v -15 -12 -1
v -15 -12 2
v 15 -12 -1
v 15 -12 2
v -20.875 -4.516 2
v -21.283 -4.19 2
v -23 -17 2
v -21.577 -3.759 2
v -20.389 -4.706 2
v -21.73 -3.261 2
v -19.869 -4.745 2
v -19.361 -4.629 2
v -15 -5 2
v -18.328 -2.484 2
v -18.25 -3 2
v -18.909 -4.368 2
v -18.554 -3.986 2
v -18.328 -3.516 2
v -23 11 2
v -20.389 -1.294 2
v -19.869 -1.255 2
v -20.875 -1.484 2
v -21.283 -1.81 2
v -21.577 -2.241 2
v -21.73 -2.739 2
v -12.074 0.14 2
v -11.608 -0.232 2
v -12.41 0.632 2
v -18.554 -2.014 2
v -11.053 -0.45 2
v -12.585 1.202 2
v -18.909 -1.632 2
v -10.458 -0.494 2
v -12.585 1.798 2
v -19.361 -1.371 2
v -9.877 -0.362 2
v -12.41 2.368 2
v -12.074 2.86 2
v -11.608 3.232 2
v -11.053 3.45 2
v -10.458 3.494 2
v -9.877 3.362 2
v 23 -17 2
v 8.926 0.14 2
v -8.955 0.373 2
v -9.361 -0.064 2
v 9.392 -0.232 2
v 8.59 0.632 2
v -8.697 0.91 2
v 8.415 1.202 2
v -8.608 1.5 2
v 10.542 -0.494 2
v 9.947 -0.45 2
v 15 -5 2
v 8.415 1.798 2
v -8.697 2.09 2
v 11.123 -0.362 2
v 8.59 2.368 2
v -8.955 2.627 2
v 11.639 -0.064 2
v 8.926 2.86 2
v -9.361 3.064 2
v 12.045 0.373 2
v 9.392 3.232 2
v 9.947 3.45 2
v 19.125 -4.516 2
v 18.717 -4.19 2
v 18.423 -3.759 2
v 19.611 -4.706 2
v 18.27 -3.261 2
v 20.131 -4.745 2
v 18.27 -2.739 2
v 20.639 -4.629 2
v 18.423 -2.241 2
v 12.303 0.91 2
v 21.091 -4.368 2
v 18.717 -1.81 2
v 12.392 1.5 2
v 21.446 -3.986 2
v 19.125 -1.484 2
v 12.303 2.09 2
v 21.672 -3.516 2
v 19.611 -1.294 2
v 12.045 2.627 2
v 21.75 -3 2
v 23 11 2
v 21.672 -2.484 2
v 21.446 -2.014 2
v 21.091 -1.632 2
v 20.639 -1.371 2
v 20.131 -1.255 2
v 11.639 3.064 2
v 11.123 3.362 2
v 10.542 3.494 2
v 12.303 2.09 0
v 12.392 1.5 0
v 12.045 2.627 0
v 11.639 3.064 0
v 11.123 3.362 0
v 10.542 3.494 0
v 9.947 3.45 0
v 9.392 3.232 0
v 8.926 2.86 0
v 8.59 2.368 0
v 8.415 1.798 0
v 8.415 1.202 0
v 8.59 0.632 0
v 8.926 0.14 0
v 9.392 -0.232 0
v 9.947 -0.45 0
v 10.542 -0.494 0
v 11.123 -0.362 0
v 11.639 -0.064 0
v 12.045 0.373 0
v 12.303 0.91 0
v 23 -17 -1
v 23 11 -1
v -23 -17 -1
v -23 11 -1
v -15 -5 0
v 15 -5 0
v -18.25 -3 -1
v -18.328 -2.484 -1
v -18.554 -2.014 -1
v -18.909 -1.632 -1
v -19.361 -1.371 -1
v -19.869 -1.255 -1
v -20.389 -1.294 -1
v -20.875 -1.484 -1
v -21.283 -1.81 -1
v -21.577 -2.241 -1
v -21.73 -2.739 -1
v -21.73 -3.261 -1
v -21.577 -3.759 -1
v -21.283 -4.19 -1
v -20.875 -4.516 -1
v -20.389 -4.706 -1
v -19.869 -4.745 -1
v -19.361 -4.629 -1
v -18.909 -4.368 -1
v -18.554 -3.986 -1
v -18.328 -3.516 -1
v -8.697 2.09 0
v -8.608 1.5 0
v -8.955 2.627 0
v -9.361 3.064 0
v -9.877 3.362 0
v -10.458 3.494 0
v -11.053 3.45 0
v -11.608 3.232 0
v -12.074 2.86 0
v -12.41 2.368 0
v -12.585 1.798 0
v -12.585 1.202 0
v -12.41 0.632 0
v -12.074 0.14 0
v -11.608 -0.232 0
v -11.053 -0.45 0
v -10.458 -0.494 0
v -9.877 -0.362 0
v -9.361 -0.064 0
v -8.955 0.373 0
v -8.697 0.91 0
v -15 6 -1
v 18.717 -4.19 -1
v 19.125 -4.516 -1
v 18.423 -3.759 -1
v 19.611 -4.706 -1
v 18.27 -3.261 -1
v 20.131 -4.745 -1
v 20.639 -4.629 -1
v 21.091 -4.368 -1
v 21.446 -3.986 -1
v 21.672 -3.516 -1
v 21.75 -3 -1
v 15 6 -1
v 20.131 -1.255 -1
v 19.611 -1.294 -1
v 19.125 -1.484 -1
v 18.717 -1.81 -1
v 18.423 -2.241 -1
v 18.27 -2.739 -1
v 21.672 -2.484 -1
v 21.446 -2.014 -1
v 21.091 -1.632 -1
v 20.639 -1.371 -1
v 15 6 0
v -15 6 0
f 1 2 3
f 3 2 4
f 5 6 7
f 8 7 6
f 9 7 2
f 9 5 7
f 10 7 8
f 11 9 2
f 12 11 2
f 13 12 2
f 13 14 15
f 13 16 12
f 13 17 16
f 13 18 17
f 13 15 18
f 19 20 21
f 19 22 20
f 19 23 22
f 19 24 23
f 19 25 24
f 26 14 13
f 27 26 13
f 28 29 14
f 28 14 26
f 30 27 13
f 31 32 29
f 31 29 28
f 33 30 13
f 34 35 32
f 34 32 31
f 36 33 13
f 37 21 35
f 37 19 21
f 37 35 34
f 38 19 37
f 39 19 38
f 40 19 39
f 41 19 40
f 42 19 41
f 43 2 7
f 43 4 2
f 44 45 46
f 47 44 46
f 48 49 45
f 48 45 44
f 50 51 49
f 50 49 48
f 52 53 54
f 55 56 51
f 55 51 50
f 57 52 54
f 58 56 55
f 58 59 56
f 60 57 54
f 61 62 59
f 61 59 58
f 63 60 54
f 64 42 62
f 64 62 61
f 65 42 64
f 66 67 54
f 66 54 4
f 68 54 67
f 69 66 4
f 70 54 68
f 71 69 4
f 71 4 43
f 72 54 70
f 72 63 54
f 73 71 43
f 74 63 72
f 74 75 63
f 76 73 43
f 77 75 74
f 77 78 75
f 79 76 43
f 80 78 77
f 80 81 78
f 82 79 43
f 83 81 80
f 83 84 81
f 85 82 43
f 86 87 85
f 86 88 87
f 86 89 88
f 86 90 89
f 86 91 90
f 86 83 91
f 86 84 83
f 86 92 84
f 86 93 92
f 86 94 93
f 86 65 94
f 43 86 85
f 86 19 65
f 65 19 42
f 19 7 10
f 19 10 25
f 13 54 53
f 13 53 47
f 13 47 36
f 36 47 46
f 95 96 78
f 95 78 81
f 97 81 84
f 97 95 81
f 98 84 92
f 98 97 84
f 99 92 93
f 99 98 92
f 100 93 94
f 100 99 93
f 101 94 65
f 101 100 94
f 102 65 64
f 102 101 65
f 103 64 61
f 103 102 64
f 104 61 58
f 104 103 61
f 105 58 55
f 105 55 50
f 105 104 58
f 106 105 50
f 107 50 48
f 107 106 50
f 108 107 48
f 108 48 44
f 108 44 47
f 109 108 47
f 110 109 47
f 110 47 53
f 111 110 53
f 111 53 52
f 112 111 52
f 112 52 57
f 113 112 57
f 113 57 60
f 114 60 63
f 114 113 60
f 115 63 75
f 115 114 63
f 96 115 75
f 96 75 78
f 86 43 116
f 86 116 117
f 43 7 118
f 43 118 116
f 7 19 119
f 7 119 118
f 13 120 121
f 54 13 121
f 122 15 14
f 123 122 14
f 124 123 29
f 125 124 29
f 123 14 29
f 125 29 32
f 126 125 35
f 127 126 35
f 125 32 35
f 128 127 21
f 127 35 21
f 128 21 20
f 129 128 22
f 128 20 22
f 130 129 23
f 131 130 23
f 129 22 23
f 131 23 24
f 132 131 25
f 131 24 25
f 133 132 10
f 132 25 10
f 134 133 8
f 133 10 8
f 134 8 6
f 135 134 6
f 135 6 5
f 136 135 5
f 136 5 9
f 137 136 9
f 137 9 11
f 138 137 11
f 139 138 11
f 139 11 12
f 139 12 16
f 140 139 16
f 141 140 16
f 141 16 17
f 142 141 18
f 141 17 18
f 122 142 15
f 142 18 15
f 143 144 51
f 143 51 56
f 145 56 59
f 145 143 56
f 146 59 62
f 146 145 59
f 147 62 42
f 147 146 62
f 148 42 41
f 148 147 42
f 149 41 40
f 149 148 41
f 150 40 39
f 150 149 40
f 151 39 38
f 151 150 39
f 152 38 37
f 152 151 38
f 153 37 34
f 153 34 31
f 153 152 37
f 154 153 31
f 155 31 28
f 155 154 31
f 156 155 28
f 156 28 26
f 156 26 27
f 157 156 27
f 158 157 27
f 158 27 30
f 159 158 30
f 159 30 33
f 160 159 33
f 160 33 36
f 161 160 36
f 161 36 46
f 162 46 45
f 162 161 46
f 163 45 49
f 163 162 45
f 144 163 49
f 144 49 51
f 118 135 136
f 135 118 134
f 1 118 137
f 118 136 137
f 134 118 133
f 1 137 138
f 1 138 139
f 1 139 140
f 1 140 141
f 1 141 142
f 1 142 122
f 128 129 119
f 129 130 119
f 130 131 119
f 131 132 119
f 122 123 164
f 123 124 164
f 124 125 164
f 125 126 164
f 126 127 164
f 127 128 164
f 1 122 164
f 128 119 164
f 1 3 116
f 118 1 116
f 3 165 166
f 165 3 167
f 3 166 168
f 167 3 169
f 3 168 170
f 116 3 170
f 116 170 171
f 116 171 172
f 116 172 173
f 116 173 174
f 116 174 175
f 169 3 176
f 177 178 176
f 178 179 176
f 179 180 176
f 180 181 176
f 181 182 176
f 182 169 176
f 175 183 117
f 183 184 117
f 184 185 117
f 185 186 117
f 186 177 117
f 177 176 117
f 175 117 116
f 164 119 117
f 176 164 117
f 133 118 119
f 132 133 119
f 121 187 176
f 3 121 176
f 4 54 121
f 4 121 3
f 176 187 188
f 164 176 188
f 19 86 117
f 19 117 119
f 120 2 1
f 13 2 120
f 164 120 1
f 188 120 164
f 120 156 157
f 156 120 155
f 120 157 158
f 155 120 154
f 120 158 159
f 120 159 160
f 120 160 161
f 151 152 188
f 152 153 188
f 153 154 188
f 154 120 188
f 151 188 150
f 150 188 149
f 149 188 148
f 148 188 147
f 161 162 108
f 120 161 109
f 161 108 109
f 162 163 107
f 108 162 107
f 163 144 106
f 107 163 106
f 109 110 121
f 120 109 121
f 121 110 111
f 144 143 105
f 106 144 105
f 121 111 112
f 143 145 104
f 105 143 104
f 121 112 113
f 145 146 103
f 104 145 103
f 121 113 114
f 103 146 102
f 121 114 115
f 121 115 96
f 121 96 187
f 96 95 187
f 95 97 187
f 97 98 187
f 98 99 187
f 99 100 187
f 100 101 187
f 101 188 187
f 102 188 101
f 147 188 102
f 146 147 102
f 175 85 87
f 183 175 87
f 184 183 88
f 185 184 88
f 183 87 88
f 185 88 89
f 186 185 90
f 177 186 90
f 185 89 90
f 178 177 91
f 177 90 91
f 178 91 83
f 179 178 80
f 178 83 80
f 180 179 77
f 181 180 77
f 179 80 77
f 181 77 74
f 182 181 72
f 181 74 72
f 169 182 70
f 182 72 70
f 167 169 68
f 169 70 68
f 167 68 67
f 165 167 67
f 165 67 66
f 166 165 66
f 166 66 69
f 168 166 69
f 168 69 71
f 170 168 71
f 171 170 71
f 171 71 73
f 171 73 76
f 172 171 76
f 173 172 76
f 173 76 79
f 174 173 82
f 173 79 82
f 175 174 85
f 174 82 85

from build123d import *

# Parameters (mm, degrees)
CROQUIS1_W          = 30
CROQUIS1_H          = 11
CROQUIS1_R          = 2
UNION_IMU_DEPTH     = 2
CROQUIS2_R          = 1.75
UNION_CARCASA_DEPTH = 3


with BuildPart() as part:
    # Croquis1 → union-imu (new body)
    with BuildSketch(Plane.XY):
        with Locations((0, 0.5)):
            Rectangle(CROQUIS1_W, CROQUIS1_H)
        with Locations((-10.607695155, 1.5)):
            Circle(CROQUIS1_R, mode=Mode.SUBTRACT)
        with Locations((10.392304845, 1.5)):
            Circle(CROQUIS1_R, mode=Mode.SUBTRACT)
    extrude(amount=UNION_IMU_DEPTH)

    # Croquis2 → union-carcasa (add)
    with BuildSketch(Plane.XY.offset(2)):
        Polygon((-23, -17), (23, -17), (23, -4), (23, 11), (-23, 11), (-23, -4), align=None)
        with Locations((20, -3)):
            Circle(CROQUIS2_R, mode=Mode.SUBTRACT)
        with Locations((-20, -3)):
            Circle(CROQUIS2_R, mode=Mode.SUBTRACT)
        Polygon((15, -12), (15, -5), (15, 6), (-15, 6), (-15, -5), (-15, -12), align=None, mode=Mode.SUBTRACT)
    extrude(amount=-UNION_CARCASA_DEPTH)


solid = part.part
